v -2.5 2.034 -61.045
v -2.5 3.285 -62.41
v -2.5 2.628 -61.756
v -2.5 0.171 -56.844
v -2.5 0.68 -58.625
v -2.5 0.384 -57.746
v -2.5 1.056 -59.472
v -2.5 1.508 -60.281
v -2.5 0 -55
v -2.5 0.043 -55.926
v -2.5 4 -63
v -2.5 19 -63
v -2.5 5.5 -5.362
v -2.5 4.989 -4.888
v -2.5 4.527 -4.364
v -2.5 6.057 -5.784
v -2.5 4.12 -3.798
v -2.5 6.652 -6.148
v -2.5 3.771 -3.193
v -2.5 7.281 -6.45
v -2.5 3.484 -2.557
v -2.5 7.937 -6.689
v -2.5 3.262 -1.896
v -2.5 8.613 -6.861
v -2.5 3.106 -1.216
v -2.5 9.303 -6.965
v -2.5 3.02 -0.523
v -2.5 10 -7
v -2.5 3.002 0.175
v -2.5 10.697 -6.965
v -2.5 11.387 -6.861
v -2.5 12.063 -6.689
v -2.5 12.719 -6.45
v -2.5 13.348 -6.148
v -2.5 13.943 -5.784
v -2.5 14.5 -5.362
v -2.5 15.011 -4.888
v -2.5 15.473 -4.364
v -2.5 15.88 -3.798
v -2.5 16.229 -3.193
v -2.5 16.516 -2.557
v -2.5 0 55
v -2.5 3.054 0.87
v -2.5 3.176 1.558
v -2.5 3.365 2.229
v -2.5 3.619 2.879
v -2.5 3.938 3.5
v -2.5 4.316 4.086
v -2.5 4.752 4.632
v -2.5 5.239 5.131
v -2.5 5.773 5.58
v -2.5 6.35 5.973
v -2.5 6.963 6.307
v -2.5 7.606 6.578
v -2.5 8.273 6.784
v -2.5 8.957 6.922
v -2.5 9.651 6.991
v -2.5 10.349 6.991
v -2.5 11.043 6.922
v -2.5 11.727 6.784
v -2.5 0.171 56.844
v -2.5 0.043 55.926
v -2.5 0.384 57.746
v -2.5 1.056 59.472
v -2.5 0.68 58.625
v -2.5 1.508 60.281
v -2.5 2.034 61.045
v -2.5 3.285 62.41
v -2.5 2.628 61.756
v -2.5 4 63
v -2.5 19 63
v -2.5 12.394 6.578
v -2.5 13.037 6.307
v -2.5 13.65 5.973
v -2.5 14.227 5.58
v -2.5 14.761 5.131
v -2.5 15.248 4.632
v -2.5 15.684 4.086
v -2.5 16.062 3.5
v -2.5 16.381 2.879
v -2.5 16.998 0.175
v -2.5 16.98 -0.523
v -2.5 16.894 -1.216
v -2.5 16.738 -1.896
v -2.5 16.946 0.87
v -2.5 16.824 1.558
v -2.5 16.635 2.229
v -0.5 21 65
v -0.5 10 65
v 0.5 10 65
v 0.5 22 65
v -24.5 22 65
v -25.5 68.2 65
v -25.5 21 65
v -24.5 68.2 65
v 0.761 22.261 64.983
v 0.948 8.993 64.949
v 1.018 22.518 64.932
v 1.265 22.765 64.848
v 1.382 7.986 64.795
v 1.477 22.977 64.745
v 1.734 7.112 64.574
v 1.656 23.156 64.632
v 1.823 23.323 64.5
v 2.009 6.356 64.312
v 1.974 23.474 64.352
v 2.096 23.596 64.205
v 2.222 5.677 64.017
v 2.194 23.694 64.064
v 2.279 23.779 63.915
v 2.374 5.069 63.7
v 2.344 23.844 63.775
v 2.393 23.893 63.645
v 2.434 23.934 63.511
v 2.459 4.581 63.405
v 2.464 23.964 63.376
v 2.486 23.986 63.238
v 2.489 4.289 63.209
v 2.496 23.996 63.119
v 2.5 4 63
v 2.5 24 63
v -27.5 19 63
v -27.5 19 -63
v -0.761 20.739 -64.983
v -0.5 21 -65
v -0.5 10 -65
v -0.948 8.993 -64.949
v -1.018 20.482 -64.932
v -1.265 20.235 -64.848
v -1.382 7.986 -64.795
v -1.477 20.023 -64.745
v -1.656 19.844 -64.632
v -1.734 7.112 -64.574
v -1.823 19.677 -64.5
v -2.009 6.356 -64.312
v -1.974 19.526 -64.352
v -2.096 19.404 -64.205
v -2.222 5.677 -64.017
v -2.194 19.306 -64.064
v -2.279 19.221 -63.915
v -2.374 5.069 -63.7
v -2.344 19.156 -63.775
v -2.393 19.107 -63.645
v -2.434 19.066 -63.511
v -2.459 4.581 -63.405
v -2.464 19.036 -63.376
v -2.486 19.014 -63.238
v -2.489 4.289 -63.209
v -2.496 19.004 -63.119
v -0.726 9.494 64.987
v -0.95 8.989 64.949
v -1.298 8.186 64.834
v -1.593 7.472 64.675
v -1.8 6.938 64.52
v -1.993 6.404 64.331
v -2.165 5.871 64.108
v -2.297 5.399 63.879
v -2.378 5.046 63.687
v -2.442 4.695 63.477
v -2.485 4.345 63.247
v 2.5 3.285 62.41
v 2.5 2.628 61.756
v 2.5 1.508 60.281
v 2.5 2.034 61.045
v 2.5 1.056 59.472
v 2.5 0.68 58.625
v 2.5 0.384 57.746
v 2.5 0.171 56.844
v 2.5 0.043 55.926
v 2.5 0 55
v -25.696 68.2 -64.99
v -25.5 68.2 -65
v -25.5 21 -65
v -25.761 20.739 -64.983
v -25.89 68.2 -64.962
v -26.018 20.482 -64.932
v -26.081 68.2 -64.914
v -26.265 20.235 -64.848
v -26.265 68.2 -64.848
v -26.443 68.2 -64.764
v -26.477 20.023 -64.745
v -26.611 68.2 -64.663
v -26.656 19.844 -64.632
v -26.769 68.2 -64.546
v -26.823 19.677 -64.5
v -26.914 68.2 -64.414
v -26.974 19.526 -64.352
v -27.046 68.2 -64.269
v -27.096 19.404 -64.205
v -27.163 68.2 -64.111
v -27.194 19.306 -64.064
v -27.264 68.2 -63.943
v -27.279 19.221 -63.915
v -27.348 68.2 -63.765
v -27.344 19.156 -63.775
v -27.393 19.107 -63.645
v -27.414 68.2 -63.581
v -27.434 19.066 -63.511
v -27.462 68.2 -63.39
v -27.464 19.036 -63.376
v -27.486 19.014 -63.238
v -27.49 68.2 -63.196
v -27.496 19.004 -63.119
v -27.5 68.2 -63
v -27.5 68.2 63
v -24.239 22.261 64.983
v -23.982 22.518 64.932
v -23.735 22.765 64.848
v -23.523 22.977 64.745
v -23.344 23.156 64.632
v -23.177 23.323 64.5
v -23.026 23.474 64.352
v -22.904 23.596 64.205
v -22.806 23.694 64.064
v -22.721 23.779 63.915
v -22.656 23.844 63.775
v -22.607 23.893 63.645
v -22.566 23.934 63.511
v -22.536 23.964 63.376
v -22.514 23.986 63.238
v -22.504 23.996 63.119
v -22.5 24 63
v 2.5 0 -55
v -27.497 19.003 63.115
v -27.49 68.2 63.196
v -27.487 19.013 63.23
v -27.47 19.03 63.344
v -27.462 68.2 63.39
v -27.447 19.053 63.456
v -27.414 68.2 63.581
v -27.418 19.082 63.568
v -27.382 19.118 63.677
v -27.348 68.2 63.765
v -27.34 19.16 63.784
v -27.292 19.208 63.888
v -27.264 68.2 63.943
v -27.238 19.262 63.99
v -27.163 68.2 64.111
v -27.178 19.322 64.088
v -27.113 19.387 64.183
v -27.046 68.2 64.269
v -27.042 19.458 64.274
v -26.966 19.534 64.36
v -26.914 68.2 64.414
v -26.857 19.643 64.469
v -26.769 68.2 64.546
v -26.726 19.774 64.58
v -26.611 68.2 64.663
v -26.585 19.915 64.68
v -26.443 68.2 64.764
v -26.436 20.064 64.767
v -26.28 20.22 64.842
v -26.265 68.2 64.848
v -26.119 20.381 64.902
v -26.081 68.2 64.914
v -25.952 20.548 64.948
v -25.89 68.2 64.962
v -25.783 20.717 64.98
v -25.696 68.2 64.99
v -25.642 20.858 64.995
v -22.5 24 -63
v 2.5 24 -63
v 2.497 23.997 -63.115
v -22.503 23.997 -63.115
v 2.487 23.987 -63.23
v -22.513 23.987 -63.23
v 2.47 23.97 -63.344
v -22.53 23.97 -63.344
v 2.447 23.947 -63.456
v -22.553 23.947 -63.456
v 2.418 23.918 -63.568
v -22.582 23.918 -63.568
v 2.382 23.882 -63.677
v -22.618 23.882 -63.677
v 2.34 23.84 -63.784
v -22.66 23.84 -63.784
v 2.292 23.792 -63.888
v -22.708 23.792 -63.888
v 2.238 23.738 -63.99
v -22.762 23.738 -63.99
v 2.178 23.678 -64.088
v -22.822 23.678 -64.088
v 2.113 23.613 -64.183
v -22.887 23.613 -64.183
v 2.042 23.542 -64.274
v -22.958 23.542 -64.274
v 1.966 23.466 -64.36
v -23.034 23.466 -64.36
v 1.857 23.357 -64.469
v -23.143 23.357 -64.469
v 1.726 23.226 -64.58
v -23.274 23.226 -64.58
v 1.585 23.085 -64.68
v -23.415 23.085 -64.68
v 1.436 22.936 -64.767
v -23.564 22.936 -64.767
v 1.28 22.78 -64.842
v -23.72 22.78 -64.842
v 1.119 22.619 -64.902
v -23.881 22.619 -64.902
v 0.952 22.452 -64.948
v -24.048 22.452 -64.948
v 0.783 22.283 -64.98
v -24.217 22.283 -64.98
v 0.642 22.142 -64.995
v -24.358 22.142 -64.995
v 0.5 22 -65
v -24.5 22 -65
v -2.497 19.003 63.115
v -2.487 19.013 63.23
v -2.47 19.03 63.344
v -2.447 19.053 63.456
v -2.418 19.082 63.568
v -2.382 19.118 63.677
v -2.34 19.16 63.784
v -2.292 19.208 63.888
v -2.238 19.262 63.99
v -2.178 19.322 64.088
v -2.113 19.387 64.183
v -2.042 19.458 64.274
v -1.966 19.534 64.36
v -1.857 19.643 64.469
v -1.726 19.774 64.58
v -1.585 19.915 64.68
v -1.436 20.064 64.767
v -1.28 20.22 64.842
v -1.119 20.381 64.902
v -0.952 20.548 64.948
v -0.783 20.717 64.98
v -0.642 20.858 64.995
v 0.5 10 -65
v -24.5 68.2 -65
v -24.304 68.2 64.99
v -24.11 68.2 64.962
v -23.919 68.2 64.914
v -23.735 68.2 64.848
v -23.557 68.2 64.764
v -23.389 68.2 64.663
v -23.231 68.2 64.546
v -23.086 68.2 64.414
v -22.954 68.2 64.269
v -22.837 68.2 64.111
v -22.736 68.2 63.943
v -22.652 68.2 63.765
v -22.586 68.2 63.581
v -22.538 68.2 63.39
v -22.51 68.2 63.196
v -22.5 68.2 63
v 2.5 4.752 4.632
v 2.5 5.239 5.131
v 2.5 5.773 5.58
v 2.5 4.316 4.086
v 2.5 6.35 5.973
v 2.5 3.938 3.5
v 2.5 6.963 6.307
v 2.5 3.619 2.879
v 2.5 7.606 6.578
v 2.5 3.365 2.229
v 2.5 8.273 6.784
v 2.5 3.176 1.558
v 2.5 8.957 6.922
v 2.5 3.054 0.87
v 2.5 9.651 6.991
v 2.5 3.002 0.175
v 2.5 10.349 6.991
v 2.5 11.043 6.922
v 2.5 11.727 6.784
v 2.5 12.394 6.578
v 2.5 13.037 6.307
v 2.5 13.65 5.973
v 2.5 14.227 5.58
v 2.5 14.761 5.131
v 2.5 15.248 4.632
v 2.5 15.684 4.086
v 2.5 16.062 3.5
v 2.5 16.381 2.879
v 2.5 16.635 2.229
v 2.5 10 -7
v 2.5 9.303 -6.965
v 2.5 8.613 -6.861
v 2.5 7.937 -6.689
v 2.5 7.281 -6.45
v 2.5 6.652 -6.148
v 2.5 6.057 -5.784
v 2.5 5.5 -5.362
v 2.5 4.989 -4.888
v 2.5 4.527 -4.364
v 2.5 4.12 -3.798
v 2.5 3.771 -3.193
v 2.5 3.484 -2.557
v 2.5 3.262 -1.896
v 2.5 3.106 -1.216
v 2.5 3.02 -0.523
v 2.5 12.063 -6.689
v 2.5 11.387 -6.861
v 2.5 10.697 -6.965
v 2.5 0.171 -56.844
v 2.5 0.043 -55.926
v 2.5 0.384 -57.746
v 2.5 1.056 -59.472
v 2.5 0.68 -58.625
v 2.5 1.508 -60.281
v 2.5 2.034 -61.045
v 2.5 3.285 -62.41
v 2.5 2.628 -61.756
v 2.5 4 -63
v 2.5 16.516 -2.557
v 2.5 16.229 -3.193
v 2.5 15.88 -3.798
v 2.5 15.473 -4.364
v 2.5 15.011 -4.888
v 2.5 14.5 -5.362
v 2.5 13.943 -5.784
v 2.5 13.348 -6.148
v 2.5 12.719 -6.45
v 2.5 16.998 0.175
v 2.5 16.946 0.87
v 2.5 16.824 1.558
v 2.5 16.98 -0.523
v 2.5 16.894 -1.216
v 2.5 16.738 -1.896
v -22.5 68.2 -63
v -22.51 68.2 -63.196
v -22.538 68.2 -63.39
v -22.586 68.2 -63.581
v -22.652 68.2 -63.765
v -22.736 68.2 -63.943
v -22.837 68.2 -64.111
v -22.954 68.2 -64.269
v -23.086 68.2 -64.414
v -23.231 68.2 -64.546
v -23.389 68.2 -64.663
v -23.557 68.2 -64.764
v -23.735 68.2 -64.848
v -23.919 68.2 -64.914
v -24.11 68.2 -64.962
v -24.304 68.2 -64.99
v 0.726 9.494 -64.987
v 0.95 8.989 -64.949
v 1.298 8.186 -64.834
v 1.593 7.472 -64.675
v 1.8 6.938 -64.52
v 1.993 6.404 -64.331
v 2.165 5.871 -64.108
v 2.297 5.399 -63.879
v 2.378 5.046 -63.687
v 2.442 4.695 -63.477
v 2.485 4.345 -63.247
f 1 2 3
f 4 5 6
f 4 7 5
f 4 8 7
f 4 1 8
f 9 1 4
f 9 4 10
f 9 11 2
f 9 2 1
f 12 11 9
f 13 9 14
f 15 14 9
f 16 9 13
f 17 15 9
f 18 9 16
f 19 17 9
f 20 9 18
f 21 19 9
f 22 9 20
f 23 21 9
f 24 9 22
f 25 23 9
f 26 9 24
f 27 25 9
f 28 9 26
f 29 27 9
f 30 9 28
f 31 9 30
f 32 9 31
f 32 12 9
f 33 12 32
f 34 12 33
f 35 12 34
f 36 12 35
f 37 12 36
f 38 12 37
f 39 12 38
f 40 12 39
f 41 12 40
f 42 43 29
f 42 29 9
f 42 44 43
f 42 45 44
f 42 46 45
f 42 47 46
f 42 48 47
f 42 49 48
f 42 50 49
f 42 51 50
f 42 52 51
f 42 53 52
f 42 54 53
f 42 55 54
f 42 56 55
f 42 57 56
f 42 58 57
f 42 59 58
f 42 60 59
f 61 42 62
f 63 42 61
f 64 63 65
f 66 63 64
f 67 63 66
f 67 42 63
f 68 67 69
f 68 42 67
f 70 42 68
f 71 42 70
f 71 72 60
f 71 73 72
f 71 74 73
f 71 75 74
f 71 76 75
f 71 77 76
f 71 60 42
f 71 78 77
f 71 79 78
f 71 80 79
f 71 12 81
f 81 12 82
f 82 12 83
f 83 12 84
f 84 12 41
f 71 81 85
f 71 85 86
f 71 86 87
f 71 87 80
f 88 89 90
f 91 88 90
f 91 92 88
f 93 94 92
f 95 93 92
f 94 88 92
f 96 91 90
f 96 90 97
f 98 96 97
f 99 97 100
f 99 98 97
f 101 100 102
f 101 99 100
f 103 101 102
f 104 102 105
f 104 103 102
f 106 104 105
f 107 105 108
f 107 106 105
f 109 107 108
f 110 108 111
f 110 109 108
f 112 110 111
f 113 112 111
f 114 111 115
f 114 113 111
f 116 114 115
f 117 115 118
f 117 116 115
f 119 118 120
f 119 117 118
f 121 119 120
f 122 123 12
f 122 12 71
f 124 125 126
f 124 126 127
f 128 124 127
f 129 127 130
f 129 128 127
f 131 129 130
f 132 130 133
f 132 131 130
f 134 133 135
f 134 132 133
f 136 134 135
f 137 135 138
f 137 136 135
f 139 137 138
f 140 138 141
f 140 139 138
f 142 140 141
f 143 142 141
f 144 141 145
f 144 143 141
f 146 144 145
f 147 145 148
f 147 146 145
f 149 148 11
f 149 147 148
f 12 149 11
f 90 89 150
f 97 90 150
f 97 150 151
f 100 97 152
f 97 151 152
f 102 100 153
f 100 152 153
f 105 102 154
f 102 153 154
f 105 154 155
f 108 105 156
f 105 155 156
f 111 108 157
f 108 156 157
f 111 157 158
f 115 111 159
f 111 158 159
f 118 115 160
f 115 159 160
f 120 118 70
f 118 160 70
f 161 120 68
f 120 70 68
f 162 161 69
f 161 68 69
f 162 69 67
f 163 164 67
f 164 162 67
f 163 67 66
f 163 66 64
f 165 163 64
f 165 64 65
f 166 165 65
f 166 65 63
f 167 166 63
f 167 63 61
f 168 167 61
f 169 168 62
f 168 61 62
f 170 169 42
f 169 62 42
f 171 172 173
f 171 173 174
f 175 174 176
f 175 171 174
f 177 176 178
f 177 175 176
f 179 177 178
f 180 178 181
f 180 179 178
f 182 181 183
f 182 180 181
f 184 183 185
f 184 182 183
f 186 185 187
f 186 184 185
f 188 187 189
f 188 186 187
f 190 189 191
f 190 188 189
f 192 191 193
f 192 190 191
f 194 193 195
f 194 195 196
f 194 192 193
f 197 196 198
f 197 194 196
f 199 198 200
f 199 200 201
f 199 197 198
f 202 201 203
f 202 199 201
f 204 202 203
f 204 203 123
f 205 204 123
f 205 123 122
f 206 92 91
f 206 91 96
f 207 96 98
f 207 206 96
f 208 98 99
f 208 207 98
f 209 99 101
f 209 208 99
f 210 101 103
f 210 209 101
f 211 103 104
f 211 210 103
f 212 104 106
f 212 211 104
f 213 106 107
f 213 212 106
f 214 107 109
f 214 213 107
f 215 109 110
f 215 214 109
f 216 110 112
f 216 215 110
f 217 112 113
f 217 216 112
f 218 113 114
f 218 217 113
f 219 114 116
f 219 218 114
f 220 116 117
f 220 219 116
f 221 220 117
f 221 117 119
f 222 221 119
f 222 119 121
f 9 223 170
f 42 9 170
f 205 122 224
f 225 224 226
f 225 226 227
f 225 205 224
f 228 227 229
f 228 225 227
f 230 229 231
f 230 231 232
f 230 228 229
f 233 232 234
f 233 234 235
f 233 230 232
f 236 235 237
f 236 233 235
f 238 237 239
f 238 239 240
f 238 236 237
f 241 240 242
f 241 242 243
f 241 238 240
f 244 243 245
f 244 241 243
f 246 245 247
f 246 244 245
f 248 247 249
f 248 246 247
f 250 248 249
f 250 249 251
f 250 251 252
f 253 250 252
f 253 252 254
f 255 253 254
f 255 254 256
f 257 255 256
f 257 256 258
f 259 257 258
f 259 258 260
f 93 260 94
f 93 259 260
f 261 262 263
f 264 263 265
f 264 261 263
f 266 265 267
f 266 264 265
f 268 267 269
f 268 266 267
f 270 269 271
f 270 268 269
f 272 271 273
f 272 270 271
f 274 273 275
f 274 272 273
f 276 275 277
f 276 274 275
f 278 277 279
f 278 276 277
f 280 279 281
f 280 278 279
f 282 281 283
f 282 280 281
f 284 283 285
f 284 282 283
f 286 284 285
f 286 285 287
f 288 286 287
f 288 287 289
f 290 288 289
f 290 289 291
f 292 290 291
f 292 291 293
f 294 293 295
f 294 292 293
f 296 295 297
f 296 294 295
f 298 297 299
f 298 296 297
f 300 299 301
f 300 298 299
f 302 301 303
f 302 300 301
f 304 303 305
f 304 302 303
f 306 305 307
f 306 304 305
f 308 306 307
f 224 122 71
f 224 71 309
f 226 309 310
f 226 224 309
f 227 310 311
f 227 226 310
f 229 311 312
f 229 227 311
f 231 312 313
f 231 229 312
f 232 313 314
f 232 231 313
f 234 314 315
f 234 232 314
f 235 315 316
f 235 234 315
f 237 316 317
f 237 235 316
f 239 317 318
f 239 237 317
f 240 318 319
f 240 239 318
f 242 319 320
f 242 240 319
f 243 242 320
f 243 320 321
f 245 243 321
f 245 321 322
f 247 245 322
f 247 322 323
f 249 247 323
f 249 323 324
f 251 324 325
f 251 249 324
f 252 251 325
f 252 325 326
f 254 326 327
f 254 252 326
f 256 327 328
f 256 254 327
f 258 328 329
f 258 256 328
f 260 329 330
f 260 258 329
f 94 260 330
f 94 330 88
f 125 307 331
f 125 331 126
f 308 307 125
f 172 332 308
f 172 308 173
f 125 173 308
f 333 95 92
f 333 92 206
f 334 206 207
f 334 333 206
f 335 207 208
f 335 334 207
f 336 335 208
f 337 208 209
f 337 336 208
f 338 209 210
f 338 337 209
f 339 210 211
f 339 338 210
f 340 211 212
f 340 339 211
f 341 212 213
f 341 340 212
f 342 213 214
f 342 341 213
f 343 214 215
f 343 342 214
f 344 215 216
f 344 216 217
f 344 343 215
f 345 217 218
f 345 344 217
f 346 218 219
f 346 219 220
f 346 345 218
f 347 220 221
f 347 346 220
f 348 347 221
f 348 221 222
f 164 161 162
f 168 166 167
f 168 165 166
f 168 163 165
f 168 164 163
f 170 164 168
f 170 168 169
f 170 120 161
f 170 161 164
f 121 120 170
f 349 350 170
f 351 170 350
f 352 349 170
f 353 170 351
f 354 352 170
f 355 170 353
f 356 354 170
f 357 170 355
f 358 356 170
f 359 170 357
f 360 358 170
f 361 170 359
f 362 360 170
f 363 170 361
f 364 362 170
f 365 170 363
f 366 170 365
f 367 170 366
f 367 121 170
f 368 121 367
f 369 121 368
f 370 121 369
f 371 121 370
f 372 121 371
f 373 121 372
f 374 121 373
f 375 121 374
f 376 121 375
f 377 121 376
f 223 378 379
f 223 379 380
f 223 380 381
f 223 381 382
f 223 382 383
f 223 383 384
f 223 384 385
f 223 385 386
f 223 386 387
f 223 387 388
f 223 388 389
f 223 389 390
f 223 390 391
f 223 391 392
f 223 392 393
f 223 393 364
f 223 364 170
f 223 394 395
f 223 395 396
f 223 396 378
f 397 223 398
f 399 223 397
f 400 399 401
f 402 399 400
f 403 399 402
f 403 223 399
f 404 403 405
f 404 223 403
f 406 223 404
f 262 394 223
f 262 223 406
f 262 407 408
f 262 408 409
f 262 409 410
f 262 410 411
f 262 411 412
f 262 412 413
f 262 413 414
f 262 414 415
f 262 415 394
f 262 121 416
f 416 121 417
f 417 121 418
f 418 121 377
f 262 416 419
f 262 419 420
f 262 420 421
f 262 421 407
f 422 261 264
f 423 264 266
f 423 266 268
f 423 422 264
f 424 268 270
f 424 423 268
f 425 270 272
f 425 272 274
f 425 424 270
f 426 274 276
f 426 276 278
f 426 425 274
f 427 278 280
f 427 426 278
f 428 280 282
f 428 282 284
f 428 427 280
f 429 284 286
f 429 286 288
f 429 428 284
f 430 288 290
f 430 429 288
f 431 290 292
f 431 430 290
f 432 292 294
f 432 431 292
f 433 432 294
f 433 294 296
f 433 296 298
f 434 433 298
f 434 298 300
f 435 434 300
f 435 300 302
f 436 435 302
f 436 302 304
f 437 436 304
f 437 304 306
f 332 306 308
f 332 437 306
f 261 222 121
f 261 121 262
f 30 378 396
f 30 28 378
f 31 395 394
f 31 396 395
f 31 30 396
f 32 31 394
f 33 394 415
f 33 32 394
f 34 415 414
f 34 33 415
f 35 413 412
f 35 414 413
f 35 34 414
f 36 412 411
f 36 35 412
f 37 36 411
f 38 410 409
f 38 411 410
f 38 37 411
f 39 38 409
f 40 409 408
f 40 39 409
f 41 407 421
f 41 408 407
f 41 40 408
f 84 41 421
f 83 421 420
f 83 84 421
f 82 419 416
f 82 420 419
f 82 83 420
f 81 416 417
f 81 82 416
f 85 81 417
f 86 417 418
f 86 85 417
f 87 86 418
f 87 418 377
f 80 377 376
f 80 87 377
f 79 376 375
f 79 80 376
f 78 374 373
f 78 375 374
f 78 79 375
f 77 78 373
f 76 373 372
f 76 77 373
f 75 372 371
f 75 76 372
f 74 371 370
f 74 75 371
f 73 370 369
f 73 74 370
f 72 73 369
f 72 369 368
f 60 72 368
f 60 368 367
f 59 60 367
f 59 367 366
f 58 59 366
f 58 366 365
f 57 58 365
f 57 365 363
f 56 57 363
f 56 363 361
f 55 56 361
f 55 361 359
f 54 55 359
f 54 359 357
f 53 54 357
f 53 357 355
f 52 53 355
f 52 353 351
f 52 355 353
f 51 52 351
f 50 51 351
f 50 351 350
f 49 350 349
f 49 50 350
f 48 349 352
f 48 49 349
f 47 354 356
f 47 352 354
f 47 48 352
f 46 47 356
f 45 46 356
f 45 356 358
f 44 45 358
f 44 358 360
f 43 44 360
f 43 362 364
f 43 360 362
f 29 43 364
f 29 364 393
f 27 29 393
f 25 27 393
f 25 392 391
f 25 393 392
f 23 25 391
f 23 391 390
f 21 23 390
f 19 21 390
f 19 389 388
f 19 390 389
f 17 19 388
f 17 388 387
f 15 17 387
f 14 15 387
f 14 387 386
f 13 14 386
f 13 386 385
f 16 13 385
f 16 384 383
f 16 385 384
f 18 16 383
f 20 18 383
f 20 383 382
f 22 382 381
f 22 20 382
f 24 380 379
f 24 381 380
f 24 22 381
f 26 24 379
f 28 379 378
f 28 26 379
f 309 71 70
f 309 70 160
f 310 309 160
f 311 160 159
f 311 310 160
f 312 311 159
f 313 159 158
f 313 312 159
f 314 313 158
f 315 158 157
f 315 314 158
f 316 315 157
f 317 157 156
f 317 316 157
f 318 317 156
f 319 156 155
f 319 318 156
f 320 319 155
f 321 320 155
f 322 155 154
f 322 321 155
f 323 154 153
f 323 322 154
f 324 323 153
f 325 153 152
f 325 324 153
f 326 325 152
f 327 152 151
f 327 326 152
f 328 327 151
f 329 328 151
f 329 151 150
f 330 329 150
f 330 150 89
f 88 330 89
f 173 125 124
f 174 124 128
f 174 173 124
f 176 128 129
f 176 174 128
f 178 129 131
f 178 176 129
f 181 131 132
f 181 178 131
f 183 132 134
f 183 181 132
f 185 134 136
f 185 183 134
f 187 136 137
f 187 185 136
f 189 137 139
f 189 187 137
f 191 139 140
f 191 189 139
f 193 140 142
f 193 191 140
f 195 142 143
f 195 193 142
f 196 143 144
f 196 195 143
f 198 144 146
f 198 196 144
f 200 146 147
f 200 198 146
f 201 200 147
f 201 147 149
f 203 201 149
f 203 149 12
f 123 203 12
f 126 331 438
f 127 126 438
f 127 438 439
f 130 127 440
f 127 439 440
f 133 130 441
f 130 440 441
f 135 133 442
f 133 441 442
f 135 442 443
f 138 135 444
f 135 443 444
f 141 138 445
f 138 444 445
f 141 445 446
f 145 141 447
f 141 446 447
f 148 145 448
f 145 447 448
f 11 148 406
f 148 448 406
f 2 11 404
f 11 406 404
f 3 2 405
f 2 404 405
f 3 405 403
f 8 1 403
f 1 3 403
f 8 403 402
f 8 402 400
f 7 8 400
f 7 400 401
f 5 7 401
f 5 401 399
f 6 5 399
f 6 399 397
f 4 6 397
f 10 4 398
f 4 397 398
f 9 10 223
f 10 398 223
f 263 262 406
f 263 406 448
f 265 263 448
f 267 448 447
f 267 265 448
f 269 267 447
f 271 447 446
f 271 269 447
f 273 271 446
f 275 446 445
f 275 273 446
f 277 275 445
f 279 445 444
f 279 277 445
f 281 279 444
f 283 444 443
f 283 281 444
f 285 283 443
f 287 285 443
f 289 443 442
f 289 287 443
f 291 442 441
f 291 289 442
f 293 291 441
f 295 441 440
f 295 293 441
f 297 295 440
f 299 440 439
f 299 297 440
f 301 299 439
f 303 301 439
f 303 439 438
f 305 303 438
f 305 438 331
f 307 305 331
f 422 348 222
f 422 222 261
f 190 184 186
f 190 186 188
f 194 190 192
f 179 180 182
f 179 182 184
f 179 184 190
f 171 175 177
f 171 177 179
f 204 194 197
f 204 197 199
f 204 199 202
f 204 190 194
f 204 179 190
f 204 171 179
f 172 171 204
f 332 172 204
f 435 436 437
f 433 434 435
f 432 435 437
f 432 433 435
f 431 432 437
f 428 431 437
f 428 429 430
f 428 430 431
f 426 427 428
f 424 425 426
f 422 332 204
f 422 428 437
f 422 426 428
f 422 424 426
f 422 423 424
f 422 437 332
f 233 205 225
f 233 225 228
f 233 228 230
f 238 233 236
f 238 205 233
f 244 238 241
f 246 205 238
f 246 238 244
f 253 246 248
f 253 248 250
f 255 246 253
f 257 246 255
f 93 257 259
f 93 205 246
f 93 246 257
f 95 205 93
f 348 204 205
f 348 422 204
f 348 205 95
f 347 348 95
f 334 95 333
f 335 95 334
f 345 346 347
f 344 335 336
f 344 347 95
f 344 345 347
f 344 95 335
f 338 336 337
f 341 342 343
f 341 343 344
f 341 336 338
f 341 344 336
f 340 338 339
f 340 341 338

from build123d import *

# Parameters (mm, degrees)
CUT_EXTRUDE1_DEPTH      = 99.145249503
CUT_EXTRUDE1_DEPTH_BACK = 99.145249503
SKETCH3_R               = 7
FILLET2_R               = 10
FILLET3_R               = 10


with BuildPart() as part:
    # Sweep1: sweep along a curve in space
    with BuildLine() as sweep1_path:
        Line((0, 0, 0), (0, 21.5, 0))
        Line((0, 21.5, 0), (-25, 21.5, 0))
        Line((-25, 21.5, 0), (-25, 68.2, 0))
    # Sketch2 → Sweep1 (sweep)
    with BuildSketch(Plane(origin=(0, 0, 0), x_dir=(1, 0, 0), z_dir=(0, 1, 0))):
        with BuildLine():
            Line((-0.5, 65), (0.5, 65))
            ThreePointArc((0.5, 65), (1.914213562, 64.414213562), (2.5, 63))
            Line((2.5, 63), (2.5, -63))
            ThreePointArc((2.5, -63), (1.914213562, -64.414213562), (0.5, -65))
            Line((0.5, -65), (-0.5, -65))
            ThreePointArc((-0.5, -65), (-1.914213562, -64.414213562), (-2.5, -63))
            Line((-2.5, -63), (-2.5, 63))
            ThreePointArc((-2.5, 63), (-1.914213562, 64.414213562), (-0.5, 65))
        make_face()
    sweep(path=sweep1_path.line, transition=Transition.RIGHT)

    # Sketch3 → Cut-Extrude1 (cut, two sides: drawn at the far end of the back side and taken through both)
    with BuildSketch(Plane(origin=(0, 0, 0), x_dir=(0, 0, -1), z_dir=(1, 0, 0)).offset(-CUT_EXTRUDE1_DEPTH_BACK)):
        with Locations((0, 10)):
            Circle(SKETCH3_R)
    extrude(amount=CUT_EXTRUDE1_DEPTH + CUT_EXTRUDE1_DEPTH_BACK, mode=Mode.SUBTRACT)

    # Fillet2
    # the kernel refuses this fillet: 10 mm, written as the material it takes off along each edge
    with BuildSketch(Plane(origin=(25.5, 0, -65), x_dir=(0, 1, 0), z_dir=(-1, 0, 0))) as fillet2_piece_1:
        with BuildLine():
            CenterArc((FILLET2_R, -FILLET2_R), FILLET2_R, 90, 90)
            Line((0, -FILLET2_R), (0, 0))
            Line((0, 0), (FILLET2_R, 0))
        make_face()
    extrude(amount=51, mode=Mode.SUBTRACT)

    # Fillet3
    # the kernel refuses this fillet: 10 mm, written as the material it takes off along each edge
    with BuildSketch(Plane(origin=(-25.5, 0, 65), x_dir=(0, 1, 0), z_dir=(1, 0, 0))) as fillet3_piece_1:
        with BuildLine():
            CenterArc((FILLET3_R, -FILLET3_R), FILLET3_R, 90, 90)
            Line((0, -FILLET3_R), (0, 0))
            Line((0, 0), (FILLET3_R, 0))
        make_face()
    extrude(amount=51, mode=Mode.SUBTRACT)


solid = part.part
